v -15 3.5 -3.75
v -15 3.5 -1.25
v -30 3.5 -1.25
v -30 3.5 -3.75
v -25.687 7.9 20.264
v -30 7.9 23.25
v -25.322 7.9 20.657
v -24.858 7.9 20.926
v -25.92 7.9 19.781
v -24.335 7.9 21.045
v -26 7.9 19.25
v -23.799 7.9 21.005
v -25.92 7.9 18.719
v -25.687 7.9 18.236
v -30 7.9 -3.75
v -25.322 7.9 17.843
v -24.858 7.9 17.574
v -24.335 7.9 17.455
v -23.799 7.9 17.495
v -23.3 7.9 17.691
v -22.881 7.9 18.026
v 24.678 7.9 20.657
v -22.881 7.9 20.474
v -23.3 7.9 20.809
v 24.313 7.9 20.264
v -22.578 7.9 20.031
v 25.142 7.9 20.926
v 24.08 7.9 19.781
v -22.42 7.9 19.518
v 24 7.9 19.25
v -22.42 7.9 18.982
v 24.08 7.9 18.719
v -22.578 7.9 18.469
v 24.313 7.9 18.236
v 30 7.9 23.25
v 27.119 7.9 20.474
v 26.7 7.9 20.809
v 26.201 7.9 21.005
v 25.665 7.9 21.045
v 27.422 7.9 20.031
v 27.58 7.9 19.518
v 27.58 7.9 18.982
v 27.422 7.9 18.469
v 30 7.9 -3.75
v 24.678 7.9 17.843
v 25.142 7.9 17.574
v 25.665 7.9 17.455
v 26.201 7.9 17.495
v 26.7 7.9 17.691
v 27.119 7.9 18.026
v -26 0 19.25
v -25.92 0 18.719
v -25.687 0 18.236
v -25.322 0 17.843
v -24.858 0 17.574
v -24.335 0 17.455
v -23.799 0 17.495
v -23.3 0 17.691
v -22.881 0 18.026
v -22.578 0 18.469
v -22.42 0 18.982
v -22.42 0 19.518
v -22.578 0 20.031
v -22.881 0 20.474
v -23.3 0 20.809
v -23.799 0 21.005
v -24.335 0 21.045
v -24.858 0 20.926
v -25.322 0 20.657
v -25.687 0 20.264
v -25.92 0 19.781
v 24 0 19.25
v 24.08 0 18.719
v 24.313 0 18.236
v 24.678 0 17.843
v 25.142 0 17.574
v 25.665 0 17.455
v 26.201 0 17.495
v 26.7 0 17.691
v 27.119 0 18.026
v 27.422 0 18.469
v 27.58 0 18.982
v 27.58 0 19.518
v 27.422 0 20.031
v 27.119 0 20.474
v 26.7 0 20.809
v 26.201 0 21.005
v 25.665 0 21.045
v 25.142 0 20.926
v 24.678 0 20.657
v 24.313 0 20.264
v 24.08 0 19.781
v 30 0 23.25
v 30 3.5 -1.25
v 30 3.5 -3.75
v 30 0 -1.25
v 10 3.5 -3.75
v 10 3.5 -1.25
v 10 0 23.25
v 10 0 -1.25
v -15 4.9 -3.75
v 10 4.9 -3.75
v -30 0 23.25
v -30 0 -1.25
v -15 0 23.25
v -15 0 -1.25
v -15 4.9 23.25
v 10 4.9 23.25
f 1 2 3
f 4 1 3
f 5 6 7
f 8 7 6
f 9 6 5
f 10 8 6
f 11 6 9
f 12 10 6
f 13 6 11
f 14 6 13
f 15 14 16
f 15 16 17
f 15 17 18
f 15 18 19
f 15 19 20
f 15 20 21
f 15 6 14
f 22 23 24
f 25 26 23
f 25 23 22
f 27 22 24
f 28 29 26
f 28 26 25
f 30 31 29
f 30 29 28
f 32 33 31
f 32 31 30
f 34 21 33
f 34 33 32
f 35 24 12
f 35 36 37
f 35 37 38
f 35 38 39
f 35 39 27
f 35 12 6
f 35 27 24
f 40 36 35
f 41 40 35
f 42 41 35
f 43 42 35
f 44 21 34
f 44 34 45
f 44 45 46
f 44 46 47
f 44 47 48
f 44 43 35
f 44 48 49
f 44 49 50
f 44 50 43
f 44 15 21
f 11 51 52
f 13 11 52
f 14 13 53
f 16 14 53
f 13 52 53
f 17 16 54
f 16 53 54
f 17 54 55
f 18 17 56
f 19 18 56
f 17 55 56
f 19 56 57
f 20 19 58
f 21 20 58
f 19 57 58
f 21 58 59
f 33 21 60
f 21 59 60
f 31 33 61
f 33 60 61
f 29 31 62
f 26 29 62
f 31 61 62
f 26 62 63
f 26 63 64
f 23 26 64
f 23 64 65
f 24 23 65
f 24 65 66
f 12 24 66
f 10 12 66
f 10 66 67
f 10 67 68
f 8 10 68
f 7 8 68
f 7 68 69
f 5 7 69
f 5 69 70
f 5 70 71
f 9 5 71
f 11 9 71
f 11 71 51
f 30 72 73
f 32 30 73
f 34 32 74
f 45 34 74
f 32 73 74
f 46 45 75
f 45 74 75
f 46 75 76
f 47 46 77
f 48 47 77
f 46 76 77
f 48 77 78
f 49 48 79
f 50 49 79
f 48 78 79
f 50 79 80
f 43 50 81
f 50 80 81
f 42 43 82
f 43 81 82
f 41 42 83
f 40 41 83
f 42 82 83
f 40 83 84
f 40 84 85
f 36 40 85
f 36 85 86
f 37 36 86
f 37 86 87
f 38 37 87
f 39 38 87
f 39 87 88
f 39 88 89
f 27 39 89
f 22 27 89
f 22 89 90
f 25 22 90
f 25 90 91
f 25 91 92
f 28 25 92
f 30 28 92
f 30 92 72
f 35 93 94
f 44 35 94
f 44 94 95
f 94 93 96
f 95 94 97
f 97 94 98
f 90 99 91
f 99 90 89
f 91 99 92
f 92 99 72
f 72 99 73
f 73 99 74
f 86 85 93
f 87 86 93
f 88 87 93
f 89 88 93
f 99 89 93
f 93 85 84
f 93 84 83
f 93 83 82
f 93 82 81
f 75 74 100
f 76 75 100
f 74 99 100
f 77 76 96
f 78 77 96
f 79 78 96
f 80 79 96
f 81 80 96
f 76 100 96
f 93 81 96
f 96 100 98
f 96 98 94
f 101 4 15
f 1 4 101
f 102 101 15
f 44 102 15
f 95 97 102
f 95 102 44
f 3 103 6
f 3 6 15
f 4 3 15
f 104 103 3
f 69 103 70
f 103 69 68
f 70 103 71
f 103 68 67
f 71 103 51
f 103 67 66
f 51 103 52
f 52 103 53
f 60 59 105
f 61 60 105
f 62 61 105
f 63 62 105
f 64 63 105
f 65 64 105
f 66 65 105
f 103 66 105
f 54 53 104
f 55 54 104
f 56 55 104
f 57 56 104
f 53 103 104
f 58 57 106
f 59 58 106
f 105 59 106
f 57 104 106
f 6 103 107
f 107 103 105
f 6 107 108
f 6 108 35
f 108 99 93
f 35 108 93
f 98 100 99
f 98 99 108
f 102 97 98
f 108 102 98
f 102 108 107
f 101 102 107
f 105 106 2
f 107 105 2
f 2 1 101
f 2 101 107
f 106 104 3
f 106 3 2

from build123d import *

# Parameters (mm, degrees)
SKETCH1_W                  = 60
SKETCH1_H                  = 2.5
BOSS_EXTRUDE1_DEPTH        = 2.5
SKETCH2_W                  = 60
SKETCH2_H                  = 5
BOSS_EXTRUDE2_DEPTH        = 3
SKETCH5_W                  = 60
SKETCH5_H                  = 5.5
BOSS_EXTRUDE4_DEPTH        = 22
SKETCH6_W                  = 60
SKETCH6_H                  = 27
BOSS_EXTRUDE5_DEPTH        = 2.4
F_3_6_3_6_DIAMETER_HOLE1_D = 3.6
SKETCH9_W                  = 25
SKETCH9_H                  = 9.609635329
CUT_EXTRUDE1_DEPTH         = 42.126755282
SKETCH10_W                 = 60
SKETCH10_H                 = 3.5
CUT_EXTRUDE2_DEPTH         = 40.530494558


with BuildPart() as part:
    # Sketch1 → Boss-Extrude1 (new body)
    with BuildSketch(Plane(origin=(0, 0, 0), x_dir=(1, 0, 0), z_dir=(0, 1, 0))):
        Rectangle(SKETCH1_W, SKETCH1_H)
    extrude(amount=BOSS_EXTRUDE1_DEPTH)

    # Sketch2 → Boss-Extrude2 (add)
    with BuildSketch(Plane(origin=(0, 2.5, 0), x_dir=(1, 0, 0), z_dir=(0, 1, 0))):
        with Locations((0, 1.25)):
            Rectangle(SKETCH2_W, SKETCH2_H)
    extrude(amount=BOSS_EXTRUDE2_DEPTH)

    # Sketch5 → Boss-Extrude4 (add)
    with BuildSketch(Plane.XY.offset(1.25)):
        with Locations((0, 2.75)):
            Rectangle(SKETCH5_W, SKETCH5_H)
    extrude(amount=BOSS_EXTRUDE4_DEPTH)

    # Sketch6 → Boss-Extrude5 (add)
    with BuildSketch(Plane(origin=(0, 5.5, 0), x_dir=(1, 0, 0), z_dir=(0, 1, 0))):
        with Locations((0, -9.75)):
            Rectangle(SKETCH6_W, SKETCH6_H)
    extrude(amount=BOSS_EXTRUDE5_DEPTH)

    # Ø3.6 (3.6) Diameter Hole1 (through all)
    with Locations(Plane(origin=(0, 7.9, 0), x_dir=(1, 0, 0), z_dir=(0, 1, 0))):
        with Locations((-24.2, -19.25), (25.8, -19.25)):
            Hole(F_3_6_3_6_DIAMETER_HOLE1_D / 2)

    # Sketch9 → Cut-Extrude1 (cut, through all)
    with BuildSketch(Plane(origin=(0, 0, -3.75), x_dir=(-1, 0, 0), z_dir=(0, 0, -1))):
        with Locations((2.5, 0.095182336)):
            Rectangle(SKETCH9_W, SKETCH9_H)
    extrude(amount=-CUT_EXTRUDE1_DEPTH, mode=Mode.SUBTRACT)

    # Sketch10 → Cut-Extrude2 (cut, through all)
    with BuildSketch(Plane(origin=(0, 0, -1.25), x_dir=(-1, 0, 0), z_dir=(0, 0, -1))):
        with Locations((0, 1.75)):
            Rectangle(SKETCH10_W, SKETCH10_H)
    extrude(amount=CUT_EXTRUDE2_DEPTH, mode=Mode.SUBTRACT)


solid = part.part
